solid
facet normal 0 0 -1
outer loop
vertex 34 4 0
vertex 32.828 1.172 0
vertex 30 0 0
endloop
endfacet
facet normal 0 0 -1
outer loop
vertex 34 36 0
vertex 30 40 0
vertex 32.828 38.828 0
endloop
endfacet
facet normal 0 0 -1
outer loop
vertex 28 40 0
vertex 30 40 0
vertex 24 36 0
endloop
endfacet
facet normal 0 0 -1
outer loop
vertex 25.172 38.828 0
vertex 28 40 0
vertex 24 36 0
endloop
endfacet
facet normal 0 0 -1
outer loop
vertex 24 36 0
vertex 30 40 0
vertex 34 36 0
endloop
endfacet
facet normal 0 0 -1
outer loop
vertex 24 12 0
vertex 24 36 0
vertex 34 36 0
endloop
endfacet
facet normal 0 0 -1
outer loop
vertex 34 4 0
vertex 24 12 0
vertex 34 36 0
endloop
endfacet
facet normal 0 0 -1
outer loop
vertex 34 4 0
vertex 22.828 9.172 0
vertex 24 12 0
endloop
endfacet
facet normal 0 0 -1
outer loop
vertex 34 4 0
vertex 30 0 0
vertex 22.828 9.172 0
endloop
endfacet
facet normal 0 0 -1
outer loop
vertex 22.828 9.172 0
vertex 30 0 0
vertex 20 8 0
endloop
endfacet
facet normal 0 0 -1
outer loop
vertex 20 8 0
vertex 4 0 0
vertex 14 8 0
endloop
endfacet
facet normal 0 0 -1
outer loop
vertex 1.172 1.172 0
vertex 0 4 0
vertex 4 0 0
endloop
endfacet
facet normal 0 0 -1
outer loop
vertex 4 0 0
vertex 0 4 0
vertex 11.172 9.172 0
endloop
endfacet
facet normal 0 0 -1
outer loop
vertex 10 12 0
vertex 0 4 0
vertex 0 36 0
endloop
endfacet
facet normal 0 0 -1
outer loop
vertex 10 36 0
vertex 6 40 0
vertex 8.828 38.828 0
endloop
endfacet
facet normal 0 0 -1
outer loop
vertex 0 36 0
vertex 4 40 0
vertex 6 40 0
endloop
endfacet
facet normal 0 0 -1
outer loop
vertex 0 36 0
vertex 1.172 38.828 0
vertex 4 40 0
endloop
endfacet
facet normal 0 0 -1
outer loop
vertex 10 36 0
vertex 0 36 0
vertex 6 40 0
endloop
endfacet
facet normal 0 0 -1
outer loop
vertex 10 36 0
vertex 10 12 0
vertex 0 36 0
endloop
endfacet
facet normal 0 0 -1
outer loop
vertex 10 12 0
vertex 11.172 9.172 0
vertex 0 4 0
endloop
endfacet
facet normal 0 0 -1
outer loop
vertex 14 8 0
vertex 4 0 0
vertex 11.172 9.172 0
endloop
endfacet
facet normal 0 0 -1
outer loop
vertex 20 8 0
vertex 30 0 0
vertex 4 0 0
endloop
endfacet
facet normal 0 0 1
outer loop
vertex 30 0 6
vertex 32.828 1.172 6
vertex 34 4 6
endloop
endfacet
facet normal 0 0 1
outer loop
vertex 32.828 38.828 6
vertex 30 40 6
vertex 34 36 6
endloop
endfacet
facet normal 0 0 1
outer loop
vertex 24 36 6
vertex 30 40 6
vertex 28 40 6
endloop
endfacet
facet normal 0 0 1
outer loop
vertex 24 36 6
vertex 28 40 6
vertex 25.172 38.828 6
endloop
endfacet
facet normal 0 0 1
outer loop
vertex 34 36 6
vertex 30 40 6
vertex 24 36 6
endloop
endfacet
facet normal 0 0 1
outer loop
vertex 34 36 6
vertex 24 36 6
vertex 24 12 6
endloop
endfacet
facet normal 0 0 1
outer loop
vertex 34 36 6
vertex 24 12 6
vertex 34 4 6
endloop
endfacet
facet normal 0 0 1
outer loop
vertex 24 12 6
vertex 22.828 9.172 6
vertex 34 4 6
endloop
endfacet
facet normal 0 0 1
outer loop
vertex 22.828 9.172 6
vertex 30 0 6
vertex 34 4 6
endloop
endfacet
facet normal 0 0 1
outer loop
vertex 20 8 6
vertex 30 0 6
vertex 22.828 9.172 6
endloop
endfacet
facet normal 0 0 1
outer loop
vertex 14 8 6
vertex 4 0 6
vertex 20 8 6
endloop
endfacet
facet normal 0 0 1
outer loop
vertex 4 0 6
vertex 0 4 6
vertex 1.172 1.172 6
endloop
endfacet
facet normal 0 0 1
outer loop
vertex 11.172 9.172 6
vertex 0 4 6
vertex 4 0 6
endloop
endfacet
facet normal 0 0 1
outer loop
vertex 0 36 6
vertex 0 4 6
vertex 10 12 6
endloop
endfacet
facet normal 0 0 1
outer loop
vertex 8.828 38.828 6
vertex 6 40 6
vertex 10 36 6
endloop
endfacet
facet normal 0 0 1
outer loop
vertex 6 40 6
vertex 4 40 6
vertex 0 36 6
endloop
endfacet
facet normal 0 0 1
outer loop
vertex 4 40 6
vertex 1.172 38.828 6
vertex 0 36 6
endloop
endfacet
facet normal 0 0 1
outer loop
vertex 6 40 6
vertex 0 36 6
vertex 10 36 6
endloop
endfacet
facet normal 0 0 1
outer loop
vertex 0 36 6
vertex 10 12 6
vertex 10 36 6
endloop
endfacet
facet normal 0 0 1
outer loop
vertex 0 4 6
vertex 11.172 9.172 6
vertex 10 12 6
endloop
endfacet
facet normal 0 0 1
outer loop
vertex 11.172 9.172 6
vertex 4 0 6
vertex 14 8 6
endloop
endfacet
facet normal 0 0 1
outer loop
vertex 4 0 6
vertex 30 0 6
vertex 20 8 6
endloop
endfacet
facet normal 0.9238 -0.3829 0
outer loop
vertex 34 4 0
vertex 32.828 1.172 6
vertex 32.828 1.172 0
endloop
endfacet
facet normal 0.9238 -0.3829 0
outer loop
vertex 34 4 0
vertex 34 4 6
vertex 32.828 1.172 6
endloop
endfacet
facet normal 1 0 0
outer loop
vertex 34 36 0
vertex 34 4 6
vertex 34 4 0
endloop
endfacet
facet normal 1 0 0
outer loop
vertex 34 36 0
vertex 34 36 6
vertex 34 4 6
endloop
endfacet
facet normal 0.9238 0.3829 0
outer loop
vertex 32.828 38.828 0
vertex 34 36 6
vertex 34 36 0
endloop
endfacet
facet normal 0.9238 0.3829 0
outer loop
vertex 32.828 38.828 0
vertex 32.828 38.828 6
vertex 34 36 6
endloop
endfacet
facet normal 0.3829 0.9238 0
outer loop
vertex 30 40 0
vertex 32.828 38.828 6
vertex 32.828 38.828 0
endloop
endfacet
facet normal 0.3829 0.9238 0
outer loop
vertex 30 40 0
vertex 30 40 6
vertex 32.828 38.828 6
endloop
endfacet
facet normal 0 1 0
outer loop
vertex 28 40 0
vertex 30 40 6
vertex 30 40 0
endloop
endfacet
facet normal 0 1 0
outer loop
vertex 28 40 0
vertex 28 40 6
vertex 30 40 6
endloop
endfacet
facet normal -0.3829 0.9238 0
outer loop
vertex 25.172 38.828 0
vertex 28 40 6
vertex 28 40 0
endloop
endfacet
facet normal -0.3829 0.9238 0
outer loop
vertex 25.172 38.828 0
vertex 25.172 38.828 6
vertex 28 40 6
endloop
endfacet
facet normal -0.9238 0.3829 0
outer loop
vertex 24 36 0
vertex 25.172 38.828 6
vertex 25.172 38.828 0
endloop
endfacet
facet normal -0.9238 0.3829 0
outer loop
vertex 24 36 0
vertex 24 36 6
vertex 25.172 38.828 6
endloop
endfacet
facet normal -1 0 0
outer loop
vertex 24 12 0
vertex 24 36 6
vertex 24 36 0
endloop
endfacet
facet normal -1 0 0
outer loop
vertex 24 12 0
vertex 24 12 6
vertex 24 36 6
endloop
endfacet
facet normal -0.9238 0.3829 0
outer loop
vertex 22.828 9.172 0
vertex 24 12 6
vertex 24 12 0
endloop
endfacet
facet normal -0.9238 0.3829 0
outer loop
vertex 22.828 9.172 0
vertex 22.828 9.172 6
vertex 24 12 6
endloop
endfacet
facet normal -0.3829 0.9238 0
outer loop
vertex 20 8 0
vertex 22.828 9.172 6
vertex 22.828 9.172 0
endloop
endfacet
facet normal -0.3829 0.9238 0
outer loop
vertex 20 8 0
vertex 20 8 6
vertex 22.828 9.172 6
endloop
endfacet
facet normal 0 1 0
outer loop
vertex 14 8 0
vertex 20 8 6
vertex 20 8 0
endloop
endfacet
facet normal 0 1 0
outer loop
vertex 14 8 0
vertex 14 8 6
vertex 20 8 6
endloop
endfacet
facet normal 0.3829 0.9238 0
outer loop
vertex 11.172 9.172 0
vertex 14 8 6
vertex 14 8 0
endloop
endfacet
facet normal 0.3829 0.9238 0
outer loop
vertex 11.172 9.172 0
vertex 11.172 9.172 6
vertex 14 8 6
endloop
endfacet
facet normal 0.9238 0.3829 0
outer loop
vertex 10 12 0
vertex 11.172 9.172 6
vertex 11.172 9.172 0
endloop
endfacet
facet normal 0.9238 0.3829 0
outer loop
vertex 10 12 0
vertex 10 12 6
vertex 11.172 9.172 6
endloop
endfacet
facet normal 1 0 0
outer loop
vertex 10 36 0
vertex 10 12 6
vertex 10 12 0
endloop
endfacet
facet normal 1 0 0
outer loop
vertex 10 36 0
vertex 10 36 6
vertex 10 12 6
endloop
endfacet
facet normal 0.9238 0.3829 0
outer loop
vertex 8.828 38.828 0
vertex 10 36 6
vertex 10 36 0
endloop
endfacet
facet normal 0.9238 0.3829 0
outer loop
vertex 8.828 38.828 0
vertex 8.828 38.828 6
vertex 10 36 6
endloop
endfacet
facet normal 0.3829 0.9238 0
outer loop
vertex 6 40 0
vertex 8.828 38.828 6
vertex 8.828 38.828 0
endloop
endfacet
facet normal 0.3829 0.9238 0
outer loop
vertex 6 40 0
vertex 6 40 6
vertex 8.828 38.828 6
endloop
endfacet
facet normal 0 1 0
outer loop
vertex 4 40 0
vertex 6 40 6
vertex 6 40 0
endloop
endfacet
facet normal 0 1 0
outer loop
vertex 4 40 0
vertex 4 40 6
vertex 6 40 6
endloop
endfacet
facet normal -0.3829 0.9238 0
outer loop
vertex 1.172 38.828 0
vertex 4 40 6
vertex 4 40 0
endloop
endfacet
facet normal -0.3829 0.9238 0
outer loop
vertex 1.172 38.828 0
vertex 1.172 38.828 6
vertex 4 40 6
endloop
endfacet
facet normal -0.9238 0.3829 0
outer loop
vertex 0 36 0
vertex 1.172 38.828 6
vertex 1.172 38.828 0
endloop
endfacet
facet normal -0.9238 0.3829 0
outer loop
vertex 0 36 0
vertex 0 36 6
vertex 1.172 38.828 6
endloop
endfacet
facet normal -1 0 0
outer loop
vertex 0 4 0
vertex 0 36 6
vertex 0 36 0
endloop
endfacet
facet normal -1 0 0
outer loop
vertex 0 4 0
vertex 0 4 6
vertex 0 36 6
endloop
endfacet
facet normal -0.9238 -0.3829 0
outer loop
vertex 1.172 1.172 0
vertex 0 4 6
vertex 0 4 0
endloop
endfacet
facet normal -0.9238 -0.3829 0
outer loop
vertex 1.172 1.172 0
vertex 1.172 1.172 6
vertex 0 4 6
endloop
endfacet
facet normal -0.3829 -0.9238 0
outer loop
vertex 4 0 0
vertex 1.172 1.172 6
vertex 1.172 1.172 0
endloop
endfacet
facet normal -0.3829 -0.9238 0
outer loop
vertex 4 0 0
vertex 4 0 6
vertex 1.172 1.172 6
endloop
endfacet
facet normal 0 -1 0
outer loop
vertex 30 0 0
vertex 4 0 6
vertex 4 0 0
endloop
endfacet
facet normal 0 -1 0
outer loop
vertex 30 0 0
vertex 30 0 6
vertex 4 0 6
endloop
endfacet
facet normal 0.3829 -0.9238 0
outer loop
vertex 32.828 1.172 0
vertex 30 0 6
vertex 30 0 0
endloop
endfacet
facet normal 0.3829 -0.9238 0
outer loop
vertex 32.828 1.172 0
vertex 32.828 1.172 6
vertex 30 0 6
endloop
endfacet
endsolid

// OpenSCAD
$fn = 32;

// ----------------------------------------------------------------------
// Eye lug: clevis, 6 mm thick
// ----------------------------------------------------------------------

// --- parameters (mm) ---
profile_height = 6;       // extrusion height
profile_points = 24;      // points of the closed outline

profile = [[0, 4], [1.172, 1.172], [4, 0], [30, 0], [32.828, 1.172], [34, 4], [34, 36], [32.828, 38.828], [30, 40], [28, 40], [25.172, 38.828], [24, 36], [24, 12], [22.828, 9.172], [20, 8], [14, 8], [11.172, 9.172], [10, 12], [10, 36], [8.828, 38.828], [6, 40], [4, 40], [1.172, 38.828], [0, 36]];  // single closed polygon, 24 points, counter clockwise

// --- the one profile operation ---
linear_extrude(height = profile_height) polygon(points = profile);
